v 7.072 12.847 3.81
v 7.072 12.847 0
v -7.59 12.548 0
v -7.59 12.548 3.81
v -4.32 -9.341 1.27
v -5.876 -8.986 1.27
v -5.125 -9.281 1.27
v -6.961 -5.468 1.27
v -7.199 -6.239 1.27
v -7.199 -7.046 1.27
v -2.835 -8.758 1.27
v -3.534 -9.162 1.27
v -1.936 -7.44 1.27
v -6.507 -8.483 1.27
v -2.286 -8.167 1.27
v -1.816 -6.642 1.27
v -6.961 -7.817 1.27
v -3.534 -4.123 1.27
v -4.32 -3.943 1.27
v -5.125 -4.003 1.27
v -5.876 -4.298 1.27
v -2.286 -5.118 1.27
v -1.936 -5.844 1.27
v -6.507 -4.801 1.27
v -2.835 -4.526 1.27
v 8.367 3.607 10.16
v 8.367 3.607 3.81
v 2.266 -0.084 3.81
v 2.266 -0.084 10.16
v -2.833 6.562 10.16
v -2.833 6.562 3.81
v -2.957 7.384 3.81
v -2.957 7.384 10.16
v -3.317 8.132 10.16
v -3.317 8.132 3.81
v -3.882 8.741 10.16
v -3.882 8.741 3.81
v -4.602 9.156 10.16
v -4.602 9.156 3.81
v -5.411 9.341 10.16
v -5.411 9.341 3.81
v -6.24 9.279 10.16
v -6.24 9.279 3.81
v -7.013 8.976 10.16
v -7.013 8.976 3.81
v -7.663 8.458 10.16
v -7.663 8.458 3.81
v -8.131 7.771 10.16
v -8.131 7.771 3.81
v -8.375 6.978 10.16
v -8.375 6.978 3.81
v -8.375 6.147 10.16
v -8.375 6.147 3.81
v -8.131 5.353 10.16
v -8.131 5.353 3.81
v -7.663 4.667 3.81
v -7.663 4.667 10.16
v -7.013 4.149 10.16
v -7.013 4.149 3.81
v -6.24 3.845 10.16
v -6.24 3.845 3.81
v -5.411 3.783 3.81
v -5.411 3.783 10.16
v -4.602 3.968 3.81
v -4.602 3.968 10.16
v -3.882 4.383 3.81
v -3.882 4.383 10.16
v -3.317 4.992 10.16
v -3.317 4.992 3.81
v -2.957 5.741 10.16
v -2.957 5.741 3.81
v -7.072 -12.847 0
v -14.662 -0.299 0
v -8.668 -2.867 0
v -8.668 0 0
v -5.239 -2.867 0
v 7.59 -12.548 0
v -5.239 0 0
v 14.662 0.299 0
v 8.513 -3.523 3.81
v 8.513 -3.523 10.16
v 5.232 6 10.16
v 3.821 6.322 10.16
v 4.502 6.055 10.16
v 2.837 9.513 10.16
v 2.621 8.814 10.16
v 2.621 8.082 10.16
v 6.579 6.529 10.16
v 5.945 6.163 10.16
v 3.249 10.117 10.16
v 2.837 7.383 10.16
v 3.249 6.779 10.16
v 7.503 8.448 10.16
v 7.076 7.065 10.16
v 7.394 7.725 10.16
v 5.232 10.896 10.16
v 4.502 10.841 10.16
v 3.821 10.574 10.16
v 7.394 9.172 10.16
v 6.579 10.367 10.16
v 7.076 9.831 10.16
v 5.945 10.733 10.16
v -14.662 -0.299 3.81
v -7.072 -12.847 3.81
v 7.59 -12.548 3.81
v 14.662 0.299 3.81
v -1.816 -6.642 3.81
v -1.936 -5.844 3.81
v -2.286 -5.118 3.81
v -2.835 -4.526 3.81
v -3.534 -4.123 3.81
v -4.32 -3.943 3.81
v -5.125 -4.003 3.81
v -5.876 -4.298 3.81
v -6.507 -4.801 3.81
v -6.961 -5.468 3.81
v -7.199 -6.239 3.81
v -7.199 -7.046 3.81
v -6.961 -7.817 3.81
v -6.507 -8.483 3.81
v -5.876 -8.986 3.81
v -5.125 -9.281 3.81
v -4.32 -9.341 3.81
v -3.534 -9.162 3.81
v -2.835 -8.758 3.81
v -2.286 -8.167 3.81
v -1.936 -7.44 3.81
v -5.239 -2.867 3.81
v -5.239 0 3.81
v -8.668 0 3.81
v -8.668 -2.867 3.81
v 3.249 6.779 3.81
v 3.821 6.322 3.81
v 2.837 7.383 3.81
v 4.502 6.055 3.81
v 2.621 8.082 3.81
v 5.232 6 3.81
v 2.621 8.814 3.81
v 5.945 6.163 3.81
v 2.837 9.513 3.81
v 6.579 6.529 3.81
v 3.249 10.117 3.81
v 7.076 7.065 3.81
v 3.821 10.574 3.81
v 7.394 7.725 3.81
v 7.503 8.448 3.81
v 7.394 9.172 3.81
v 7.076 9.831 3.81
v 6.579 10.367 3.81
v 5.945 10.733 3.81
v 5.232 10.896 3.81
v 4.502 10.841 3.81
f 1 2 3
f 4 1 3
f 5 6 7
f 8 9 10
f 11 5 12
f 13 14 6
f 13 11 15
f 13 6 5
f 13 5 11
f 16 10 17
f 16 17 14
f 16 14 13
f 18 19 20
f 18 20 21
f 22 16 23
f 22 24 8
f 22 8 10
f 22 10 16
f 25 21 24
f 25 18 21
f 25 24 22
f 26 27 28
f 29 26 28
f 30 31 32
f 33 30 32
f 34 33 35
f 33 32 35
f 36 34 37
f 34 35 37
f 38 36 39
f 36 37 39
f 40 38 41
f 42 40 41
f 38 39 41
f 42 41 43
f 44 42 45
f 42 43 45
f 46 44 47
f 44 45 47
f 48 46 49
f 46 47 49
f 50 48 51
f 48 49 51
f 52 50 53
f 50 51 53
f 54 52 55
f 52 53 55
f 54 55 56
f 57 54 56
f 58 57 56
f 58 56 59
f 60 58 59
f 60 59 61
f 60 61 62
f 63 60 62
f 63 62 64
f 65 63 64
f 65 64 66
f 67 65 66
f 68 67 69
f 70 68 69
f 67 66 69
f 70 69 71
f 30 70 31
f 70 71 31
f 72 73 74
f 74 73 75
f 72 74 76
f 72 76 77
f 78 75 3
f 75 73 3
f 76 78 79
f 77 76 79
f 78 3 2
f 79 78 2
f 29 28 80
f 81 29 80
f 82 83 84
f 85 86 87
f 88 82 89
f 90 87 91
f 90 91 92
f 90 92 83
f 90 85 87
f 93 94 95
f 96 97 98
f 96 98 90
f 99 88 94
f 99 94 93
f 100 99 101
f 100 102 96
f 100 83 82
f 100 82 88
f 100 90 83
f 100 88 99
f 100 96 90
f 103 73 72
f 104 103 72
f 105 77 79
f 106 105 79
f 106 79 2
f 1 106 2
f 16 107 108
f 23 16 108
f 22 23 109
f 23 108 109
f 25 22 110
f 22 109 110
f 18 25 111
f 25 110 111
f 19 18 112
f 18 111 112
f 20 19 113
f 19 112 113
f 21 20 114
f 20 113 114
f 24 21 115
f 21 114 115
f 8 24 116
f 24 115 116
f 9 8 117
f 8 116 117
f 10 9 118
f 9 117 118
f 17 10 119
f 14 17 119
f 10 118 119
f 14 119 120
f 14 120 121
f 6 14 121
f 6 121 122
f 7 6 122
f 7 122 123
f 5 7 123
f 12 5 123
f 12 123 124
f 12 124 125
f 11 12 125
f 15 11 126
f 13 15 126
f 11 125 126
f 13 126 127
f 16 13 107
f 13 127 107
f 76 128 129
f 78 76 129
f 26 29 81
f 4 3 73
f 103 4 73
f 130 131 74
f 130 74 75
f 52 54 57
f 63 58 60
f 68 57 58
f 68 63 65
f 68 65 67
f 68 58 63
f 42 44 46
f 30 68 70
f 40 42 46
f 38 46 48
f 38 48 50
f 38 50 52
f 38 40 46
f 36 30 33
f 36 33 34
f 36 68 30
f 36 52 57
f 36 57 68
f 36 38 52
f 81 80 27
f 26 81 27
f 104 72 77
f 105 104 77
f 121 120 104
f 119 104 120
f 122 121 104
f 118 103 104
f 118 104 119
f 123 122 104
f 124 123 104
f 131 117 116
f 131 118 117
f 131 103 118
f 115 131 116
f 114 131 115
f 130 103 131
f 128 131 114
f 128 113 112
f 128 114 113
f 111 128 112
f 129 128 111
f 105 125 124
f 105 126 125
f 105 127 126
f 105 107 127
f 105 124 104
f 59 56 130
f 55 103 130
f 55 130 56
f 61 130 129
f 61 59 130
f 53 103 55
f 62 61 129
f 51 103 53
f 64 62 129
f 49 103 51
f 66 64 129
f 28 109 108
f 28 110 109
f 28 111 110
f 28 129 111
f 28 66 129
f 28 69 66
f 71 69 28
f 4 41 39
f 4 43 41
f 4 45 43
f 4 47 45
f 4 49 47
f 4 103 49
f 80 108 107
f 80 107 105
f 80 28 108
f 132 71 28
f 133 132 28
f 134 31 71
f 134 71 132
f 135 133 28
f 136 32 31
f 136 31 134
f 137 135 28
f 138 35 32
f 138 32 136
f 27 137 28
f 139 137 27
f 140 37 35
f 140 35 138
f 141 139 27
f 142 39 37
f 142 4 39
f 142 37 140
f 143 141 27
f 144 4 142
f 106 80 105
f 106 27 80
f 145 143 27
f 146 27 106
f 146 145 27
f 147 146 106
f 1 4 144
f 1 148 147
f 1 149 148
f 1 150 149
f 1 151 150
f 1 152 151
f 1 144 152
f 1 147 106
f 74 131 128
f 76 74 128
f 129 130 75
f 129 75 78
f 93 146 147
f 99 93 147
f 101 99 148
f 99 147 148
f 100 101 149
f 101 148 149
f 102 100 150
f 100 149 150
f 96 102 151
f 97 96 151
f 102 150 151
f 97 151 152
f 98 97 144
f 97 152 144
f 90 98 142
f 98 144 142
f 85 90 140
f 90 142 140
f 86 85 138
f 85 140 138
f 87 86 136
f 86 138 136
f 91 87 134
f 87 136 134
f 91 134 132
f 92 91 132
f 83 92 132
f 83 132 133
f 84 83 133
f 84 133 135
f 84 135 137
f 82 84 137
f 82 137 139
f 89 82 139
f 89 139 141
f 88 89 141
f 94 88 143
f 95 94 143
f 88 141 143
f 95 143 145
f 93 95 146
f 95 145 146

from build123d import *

# Parameters (mm, degrees)
F1_DEPTH = 3.81
F2_R     = 2.786775
F2_R_2   = 2.454424
F3_DEPTH = 6.35
F4_W     = 3.428999
F4_H     = 2.867069
F5_DEPTH = 5.08
F6_R     = 2.706702
F7_DEPTH = 2.54


with BuildPart() as f1:
    # F0 (on Top) → F1 (new body)
    with BuildSketch(Plane.XY):
        Polygon((14.661641, 0.299343), (7.071582, 12.847025), (-7.590059, 12.547683), (-14.661641, -0.299343), (-7.071582, -12.847025), (7.590059, -12.547683), align=None)
    extrude(amount=F1_DEPTH)

    # F2 (on face) → F3 (join)
    with BuildSketch(Plane.XY.offset(3.81)):
        with Locations((-5.619749, 6.562192)):
            Circle(F2_R)
        with Locations((5.048249, 8.448053)):
            Circle(F2_R_2)
        Polygon((8.512636, -3.522729), (8.367075, 3.606768), (2.265531, -0.08404), align=None)
    extrude(amount=F3_DEPTH)

    # F4 (on face) → F5 (cut)
    with BuildSketch(Plane.XY.offset(3.81)):
        with Locations((-6.953249, -1.433534)):
            Rectangle(F4_W, F4_H)
    extrude(amount=-F5_DEPTH, mode=Mode.SUBTRACT)

    # F6 (on face) → F7 (cut)
    with BuildSketch(Plane.XY.offset(3.81)):
        with Locations((-4.522542, -6.642293)):
            Circle(F6_R)
    extrude(amount=-F7_DEPTH, mode=Mode.SUBTRACT)


solid = f1.part
